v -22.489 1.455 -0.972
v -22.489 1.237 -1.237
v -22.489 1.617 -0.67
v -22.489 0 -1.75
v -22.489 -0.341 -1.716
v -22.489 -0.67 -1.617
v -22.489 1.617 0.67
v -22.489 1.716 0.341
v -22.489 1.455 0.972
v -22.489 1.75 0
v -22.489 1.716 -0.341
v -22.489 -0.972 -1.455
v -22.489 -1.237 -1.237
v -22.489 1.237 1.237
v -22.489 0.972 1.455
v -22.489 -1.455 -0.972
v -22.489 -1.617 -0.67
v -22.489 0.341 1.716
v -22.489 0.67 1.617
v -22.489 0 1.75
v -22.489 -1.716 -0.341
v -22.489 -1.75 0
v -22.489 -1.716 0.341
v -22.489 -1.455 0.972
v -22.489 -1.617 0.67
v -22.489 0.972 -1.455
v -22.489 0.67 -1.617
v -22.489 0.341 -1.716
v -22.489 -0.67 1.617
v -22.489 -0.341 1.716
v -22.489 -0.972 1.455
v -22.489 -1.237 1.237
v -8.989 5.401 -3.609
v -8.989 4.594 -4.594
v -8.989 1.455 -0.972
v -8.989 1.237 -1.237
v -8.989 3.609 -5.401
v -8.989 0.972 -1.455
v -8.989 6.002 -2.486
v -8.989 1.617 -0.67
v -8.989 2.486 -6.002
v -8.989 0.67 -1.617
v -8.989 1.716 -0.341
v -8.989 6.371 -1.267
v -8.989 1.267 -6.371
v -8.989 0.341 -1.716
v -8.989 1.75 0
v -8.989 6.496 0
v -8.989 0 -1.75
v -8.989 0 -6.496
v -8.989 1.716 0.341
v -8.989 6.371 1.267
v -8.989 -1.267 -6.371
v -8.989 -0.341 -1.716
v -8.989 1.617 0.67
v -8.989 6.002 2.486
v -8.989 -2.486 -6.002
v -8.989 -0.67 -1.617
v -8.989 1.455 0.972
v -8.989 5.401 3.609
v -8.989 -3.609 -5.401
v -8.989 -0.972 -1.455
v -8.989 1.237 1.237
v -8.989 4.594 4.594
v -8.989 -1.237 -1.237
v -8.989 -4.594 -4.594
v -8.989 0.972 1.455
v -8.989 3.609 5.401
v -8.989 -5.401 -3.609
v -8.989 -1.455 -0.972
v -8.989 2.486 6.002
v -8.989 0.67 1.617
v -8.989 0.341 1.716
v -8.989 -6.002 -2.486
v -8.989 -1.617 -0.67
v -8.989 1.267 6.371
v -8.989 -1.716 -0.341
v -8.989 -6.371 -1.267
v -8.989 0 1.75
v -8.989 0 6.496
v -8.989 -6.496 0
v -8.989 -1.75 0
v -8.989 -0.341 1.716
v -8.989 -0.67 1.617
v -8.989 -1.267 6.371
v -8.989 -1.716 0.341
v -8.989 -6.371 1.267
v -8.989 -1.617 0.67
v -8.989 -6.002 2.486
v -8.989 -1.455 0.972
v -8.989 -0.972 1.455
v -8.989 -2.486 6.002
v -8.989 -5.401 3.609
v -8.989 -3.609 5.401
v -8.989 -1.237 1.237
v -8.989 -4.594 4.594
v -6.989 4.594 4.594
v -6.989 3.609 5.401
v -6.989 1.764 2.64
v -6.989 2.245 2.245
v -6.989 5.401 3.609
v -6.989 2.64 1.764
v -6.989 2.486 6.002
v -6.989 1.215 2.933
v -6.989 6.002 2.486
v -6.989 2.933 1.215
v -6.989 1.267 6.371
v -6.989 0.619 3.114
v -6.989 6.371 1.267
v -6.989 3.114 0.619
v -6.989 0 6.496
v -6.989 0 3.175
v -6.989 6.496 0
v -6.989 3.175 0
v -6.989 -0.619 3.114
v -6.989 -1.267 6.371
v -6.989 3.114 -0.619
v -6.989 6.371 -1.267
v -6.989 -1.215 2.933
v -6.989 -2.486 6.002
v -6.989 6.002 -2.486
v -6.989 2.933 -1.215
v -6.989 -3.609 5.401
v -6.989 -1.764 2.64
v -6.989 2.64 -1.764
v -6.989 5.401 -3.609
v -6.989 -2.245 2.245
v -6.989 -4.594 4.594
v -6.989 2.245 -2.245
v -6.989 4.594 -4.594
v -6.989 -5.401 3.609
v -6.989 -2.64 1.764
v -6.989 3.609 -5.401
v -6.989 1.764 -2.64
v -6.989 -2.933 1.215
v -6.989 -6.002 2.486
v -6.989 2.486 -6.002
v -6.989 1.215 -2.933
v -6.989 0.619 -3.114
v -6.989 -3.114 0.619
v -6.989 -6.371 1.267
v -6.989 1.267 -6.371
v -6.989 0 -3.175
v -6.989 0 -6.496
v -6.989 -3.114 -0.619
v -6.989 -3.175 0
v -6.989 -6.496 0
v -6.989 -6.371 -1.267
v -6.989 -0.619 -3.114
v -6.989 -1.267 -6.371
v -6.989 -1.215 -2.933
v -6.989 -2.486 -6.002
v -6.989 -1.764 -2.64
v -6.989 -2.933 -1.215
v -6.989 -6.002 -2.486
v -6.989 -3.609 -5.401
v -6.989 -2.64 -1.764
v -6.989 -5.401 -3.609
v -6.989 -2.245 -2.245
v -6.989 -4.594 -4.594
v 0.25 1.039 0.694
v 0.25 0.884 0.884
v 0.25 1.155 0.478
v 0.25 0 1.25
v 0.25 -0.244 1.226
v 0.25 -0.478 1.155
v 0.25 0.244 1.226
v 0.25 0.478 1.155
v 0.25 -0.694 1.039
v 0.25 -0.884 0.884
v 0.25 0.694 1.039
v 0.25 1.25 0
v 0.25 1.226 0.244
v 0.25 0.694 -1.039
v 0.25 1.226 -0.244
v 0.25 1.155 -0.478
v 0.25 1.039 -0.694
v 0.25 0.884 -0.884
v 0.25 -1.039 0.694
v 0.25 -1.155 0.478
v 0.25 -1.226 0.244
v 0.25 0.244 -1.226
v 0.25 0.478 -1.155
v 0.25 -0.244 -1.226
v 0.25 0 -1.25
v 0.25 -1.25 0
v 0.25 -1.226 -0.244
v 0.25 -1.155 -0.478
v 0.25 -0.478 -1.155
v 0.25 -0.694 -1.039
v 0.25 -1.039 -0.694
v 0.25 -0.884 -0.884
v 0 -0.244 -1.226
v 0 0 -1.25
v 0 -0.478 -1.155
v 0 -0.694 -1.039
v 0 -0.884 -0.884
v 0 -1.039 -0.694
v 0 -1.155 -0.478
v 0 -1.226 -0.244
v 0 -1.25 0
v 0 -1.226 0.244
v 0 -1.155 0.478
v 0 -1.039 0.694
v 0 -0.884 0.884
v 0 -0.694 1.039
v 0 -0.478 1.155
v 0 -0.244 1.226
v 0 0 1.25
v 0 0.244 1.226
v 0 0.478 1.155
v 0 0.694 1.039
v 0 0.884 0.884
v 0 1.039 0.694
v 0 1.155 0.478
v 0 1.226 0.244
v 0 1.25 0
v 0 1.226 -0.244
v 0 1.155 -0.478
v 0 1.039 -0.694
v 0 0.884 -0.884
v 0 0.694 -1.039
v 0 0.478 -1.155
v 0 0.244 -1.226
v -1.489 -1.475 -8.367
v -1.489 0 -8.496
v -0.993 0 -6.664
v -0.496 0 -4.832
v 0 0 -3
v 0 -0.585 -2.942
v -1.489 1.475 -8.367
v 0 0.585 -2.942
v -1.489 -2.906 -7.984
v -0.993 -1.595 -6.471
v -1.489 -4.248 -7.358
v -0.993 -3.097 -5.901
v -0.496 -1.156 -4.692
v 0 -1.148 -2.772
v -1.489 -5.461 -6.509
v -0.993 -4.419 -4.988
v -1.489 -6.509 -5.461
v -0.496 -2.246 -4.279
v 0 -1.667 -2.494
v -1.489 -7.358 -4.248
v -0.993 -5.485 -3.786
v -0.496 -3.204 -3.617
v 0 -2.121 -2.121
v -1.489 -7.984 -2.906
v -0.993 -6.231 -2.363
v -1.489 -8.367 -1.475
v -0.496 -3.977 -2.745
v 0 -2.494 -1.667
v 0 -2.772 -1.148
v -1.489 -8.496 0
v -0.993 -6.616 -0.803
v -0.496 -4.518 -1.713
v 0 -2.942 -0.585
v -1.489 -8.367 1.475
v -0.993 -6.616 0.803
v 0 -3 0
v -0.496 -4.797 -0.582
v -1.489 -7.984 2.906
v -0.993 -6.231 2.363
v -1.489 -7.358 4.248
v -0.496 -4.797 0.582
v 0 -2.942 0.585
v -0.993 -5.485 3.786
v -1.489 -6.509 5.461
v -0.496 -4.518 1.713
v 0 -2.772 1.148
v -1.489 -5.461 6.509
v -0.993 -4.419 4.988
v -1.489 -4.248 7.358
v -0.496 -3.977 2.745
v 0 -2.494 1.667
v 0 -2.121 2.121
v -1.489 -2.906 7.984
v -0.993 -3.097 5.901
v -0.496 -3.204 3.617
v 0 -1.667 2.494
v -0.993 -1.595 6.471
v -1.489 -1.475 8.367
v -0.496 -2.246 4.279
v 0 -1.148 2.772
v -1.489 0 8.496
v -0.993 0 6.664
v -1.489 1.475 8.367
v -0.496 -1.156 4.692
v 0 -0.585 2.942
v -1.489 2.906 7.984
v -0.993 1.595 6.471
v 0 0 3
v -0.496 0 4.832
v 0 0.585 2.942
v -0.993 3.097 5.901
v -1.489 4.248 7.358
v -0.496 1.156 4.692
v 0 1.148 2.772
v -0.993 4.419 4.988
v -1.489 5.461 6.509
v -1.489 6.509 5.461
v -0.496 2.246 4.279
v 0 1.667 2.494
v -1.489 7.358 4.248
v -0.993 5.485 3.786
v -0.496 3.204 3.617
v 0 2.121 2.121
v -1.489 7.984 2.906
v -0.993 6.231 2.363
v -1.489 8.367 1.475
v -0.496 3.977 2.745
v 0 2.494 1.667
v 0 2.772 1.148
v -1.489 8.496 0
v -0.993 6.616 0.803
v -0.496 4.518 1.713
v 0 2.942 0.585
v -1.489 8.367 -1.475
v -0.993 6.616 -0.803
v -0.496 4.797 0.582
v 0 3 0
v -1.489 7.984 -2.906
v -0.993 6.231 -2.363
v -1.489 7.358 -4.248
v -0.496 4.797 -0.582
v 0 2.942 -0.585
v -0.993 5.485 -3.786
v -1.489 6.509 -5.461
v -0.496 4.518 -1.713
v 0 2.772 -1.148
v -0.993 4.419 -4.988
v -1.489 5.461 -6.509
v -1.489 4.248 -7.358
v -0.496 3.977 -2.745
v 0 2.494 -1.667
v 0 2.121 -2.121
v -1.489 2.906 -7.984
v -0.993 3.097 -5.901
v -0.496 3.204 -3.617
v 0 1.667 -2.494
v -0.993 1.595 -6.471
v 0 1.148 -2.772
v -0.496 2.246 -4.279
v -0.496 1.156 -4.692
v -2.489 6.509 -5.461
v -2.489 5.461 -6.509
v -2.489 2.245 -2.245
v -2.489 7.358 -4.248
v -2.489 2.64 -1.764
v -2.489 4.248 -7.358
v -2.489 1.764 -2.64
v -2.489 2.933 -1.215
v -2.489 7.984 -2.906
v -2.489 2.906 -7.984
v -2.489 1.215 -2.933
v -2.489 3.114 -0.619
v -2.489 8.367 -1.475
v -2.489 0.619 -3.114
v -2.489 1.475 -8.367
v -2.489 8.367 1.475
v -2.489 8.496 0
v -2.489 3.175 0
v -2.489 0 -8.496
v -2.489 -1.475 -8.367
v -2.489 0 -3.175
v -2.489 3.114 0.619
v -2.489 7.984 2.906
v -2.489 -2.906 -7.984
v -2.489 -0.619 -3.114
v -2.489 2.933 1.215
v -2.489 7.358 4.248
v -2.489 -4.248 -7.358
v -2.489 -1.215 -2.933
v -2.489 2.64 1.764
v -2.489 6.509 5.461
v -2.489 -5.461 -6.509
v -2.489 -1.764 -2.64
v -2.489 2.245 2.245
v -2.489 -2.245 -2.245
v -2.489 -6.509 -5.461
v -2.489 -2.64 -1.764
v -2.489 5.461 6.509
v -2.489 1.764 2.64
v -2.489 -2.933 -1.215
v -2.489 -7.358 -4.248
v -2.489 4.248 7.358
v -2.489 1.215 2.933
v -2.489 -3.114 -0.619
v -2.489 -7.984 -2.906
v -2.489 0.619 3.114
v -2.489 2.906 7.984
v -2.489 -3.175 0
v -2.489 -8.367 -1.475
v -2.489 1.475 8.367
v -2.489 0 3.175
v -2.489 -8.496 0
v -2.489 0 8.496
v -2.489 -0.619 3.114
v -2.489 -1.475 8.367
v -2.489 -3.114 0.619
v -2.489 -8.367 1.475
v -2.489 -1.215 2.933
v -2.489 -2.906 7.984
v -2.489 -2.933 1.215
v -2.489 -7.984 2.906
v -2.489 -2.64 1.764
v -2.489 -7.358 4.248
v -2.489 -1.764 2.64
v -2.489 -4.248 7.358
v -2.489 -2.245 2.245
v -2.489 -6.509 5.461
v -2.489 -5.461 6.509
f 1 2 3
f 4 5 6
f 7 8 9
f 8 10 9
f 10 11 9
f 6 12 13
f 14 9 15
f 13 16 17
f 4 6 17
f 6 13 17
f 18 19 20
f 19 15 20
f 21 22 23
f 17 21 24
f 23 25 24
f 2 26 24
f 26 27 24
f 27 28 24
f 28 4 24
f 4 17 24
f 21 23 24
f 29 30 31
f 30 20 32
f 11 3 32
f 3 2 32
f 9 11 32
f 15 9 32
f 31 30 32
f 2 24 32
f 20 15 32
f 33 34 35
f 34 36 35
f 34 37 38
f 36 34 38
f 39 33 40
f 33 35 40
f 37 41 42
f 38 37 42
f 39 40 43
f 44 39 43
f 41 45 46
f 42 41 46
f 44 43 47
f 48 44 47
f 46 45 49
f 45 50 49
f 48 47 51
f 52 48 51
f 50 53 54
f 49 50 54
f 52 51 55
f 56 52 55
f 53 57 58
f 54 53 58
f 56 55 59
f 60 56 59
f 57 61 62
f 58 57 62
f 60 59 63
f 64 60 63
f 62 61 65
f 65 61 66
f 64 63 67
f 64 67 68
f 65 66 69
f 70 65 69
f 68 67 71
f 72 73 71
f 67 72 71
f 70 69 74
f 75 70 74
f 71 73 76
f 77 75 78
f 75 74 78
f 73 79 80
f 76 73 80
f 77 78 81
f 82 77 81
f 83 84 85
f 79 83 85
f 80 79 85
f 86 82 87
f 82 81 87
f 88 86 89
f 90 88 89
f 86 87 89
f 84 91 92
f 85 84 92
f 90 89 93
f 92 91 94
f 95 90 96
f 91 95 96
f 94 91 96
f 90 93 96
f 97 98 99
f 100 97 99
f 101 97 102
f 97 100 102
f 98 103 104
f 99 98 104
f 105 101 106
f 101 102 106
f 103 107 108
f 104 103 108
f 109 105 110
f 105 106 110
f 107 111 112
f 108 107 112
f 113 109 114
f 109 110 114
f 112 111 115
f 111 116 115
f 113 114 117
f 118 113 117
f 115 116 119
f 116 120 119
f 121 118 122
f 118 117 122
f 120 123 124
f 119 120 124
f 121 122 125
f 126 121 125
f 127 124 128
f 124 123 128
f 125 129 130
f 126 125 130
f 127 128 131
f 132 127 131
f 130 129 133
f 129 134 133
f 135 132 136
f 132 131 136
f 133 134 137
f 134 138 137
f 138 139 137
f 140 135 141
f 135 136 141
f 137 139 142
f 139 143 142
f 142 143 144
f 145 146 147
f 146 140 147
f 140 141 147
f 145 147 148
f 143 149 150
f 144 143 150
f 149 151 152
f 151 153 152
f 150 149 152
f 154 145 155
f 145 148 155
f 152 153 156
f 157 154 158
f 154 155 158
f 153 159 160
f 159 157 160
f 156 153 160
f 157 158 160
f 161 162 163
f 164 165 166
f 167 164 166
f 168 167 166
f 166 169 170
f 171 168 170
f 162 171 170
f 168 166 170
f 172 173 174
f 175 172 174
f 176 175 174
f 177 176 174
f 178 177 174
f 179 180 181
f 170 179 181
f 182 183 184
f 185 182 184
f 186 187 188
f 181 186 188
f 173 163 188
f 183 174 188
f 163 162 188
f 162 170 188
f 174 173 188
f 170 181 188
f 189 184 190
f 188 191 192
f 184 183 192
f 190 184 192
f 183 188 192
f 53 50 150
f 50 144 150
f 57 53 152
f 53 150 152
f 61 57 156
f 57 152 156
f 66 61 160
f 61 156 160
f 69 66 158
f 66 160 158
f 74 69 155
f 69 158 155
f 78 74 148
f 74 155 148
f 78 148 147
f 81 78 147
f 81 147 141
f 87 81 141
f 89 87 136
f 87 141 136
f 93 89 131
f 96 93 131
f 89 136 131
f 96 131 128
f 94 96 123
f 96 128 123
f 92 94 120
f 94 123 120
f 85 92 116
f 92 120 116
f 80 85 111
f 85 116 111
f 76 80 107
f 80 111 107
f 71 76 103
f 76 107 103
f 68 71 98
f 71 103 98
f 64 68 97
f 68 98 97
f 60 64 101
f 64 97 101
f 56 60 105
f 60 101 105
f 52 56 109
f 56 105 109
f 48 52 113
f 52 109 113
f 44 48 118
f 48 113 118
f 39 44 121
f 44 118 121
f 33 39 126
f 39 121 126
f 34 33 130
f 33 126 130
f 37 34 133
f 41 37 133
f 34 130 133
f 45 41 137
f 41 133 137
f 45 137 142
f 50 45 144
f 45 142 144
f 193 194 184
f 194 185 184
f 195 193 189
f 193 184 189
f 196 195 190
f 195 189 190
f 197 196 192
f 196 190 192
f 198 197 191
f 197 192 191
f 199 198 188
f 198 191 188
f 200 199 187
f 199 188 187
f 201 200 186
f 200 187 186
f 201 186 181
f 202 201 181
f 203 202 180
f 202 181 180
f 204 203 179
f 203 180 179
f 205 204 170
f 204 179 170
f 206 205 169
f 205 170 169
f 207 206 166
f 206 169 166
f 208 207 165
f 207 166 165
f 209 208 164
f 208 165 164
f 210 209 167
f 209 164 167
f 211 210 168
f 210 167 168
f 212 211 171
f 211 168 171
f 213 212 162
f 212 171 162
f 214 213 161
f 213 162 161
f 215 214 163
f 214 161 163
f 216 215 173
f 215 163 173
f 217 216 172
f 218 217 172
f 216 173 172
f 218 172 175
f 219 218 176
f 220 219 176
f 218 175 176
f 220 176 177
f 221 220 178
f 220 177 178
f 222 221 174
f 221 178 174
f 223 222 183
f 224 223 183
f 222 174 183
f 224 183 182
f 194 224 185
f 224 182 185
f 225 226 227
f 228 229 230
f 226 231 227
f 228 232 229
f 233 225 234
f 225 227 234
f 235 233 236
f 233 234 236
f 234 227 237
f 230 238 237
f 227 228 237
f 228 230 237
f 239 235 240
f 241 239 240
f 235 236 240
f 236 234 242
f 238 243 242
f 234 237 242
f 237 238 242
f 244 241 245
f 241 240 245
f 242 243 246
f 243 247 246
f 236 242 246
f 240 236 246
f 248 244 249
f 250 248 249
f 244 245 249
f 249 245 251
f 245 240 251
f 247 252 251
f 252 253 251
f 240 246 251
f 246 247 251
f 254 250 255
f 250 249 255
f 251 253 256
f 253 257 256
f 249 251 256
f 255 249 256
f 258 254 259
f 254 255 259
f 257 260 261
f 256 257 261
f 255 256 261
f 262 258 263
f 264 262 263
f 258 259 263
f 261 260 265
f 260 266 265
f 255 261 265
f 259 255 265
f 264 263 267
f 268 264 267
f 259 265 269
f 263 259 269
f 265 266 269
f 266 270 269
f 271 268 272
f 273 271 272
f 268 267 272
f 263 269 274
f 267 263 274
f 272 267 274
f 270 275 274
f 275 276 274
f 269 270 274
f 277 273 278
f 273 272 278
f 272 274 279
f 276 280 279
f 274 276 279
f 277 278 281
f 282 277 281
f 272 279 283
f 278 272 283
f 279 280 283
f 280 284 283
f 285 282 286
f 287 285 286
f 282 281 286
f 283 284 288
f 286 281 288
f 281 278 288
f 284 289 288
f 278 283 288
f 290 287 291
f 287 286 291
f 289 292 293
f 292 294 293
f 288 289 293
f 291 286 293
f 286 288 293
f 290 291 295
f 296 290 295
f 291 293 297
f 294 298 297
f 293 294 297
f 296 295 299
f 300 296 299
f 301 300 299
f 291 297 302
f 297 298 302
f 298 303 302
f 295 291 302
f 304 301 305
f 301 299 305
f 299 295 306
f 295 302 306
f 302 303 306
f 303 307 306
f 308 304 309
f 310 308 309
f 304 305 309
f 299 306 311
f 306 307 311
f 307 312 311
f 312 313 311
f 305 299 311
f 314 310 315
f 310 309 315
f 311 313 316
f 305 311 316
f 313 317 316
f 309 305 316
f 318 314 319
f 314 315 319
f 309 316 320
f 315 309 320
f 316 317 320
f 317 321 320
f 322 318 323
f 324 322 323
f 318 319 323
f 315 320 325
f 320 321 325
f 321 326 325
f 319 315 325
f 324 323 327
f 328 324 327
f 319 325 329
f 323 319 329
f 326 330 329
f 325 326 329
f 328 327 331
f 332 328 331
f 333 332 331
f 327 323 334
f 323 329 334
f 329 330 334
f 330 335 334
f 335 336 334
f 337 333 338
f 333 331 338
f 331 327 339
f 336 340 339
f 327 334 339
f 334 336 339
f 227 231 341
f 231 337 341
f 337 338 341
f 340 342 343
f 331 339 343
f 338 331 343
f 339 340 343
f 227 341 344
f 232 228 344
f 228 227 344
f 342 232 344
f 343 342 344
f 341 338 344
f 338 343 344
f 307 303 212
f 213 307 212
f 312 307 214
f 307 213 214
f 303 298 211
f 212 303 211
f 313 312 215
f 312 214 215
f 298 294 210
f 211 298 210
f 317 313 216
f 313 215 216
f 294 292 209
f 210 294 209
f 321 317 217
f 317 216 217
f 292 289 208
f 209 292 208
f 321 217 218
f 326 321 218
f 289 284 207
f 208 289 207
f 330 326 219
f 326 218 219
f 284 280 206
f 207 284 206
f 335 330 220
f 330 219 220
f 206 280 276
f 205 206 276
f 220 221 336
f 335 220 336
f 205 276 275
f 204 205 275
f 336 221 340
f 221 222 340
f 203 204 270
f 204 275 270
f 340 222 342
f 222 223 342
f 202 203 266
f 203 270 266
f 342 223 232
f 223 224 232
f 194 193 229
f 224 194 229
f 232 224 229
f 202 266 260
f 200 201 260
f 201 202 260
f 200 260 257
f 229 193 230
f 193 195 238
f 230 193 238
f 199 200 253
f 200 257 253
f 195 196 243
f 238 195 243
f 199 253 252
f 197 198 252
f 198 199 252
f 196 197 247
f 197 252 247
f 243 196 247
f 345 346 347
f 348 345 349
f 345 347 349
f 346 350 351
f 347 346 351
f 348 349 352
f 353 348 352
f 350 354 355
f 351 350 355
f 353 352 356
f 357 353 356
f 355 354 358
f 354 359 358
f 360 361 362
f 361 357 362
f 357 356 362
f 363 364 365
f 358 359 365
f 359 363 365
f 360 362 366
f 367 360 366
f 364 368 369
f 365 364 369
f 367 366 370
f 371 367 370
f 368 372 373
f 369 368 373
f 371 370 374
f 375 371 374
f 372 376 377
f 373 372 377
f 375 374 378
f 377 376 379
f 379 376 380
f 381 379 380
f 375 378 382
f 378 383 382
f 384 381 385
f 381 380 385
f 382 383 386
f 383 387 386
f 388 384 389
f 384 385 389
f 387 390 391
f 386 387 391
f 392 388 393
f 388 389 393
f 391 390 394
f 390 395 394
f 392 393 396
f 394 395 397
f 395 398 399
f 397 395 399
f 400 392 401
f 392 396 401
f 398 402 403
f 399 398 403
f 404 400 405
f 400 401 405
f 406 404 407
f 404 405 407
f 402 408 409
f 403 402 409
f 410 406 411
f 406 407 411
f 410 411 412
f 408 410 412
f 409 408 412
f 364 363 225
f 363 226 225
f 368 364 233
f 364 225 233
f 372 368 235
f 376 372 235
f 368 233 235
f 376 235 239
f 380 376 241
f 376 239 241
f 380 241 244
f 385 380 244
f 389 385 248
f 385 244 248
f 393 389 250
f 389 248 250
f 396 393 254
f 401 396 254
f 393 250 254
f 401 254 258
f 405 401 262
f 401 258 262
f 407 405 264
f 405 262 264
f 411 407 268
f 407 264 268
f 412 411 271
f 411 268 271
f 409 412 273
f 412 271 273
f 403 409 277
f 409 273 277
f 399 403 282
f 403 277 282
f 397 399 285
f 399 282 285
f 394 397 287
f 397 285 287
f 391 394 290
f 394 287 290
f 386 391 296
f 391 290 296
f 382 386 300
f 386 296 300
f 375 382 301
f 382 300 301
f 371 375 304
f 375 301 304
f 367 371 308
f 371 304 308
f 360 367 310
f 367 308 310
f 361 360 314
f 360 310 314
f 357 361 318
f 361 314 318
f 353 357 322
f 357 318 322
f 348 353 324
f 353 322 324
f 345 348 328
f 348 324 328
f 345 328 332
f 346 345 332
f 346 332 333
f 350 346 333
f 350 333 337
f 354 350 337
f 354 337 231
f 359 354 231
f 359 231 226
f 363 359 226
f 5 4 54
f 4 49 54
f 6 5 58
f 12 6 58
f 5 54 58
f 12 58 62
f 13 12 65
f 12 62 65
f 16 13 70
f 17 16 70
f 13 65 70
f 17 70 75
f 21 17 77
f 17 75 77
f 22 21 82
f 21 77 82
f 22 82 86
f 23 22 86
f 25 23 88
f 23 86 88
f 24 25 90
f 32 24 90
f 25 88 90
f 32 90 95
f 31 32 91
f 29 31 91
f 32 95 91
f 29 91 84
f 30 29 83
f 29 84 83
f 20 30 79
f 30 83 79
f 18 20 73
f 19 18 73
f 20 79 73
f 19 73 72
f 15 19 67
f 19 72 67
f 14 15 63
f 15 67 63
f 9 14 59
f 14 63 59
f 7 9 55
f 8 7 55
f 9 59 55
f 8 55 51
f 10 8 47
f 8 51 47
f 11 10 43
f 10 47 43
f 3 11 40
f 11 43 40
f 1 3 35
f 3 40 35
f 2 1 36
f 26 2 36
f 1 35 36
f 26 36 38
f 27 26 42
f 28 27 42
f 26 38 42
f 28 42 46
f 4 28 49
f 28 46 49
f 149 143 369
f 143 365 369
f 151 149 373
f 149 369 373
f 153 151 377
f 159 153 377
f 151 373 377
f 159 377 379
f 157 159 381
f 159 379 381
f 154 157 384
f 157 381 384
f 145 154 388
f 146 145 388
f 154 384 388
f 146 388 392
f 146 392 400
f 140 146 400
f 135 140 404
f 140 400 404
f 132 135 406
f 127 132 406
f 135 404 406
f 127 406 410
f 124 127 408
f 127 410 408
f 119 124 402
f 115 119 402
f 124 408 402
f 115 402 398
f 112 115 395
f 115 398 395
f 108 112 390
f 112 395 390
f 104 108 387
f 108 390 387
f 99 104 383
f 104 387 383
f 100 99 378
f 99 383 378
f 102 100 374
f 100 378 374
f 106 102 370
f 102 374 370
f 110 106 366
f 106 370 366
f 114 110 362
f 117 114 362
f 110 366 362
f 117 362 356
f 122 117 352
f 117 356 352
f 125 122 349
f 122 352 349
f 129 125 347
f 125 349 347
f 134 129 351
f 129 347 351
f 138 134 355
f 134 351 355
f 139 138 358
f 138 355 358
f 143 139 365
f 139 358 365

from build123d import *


with BuildPart() as part:
    # Sketch1 → Revolve1 (revolve)
    with BuildSketch(Plane.XY):
        Polygon((-22.4892, 1.75), (-8.9892, 1.75), (-8.9892, 6.4963), (-6.9892, 6.4963), (-6.9892, 3.175), (-2.4892, 3.175), (-2.4892, 8.4963), (-1.4892, 8.4963), (0, 3), (0, 1.25), (0.25, 1.25), (0.25, 0), (-22.4892, 0), align=None)
    revolve(axis=Axis((-22.4892, 0, 0), (-1, 0, 0)))


solid = part.part
